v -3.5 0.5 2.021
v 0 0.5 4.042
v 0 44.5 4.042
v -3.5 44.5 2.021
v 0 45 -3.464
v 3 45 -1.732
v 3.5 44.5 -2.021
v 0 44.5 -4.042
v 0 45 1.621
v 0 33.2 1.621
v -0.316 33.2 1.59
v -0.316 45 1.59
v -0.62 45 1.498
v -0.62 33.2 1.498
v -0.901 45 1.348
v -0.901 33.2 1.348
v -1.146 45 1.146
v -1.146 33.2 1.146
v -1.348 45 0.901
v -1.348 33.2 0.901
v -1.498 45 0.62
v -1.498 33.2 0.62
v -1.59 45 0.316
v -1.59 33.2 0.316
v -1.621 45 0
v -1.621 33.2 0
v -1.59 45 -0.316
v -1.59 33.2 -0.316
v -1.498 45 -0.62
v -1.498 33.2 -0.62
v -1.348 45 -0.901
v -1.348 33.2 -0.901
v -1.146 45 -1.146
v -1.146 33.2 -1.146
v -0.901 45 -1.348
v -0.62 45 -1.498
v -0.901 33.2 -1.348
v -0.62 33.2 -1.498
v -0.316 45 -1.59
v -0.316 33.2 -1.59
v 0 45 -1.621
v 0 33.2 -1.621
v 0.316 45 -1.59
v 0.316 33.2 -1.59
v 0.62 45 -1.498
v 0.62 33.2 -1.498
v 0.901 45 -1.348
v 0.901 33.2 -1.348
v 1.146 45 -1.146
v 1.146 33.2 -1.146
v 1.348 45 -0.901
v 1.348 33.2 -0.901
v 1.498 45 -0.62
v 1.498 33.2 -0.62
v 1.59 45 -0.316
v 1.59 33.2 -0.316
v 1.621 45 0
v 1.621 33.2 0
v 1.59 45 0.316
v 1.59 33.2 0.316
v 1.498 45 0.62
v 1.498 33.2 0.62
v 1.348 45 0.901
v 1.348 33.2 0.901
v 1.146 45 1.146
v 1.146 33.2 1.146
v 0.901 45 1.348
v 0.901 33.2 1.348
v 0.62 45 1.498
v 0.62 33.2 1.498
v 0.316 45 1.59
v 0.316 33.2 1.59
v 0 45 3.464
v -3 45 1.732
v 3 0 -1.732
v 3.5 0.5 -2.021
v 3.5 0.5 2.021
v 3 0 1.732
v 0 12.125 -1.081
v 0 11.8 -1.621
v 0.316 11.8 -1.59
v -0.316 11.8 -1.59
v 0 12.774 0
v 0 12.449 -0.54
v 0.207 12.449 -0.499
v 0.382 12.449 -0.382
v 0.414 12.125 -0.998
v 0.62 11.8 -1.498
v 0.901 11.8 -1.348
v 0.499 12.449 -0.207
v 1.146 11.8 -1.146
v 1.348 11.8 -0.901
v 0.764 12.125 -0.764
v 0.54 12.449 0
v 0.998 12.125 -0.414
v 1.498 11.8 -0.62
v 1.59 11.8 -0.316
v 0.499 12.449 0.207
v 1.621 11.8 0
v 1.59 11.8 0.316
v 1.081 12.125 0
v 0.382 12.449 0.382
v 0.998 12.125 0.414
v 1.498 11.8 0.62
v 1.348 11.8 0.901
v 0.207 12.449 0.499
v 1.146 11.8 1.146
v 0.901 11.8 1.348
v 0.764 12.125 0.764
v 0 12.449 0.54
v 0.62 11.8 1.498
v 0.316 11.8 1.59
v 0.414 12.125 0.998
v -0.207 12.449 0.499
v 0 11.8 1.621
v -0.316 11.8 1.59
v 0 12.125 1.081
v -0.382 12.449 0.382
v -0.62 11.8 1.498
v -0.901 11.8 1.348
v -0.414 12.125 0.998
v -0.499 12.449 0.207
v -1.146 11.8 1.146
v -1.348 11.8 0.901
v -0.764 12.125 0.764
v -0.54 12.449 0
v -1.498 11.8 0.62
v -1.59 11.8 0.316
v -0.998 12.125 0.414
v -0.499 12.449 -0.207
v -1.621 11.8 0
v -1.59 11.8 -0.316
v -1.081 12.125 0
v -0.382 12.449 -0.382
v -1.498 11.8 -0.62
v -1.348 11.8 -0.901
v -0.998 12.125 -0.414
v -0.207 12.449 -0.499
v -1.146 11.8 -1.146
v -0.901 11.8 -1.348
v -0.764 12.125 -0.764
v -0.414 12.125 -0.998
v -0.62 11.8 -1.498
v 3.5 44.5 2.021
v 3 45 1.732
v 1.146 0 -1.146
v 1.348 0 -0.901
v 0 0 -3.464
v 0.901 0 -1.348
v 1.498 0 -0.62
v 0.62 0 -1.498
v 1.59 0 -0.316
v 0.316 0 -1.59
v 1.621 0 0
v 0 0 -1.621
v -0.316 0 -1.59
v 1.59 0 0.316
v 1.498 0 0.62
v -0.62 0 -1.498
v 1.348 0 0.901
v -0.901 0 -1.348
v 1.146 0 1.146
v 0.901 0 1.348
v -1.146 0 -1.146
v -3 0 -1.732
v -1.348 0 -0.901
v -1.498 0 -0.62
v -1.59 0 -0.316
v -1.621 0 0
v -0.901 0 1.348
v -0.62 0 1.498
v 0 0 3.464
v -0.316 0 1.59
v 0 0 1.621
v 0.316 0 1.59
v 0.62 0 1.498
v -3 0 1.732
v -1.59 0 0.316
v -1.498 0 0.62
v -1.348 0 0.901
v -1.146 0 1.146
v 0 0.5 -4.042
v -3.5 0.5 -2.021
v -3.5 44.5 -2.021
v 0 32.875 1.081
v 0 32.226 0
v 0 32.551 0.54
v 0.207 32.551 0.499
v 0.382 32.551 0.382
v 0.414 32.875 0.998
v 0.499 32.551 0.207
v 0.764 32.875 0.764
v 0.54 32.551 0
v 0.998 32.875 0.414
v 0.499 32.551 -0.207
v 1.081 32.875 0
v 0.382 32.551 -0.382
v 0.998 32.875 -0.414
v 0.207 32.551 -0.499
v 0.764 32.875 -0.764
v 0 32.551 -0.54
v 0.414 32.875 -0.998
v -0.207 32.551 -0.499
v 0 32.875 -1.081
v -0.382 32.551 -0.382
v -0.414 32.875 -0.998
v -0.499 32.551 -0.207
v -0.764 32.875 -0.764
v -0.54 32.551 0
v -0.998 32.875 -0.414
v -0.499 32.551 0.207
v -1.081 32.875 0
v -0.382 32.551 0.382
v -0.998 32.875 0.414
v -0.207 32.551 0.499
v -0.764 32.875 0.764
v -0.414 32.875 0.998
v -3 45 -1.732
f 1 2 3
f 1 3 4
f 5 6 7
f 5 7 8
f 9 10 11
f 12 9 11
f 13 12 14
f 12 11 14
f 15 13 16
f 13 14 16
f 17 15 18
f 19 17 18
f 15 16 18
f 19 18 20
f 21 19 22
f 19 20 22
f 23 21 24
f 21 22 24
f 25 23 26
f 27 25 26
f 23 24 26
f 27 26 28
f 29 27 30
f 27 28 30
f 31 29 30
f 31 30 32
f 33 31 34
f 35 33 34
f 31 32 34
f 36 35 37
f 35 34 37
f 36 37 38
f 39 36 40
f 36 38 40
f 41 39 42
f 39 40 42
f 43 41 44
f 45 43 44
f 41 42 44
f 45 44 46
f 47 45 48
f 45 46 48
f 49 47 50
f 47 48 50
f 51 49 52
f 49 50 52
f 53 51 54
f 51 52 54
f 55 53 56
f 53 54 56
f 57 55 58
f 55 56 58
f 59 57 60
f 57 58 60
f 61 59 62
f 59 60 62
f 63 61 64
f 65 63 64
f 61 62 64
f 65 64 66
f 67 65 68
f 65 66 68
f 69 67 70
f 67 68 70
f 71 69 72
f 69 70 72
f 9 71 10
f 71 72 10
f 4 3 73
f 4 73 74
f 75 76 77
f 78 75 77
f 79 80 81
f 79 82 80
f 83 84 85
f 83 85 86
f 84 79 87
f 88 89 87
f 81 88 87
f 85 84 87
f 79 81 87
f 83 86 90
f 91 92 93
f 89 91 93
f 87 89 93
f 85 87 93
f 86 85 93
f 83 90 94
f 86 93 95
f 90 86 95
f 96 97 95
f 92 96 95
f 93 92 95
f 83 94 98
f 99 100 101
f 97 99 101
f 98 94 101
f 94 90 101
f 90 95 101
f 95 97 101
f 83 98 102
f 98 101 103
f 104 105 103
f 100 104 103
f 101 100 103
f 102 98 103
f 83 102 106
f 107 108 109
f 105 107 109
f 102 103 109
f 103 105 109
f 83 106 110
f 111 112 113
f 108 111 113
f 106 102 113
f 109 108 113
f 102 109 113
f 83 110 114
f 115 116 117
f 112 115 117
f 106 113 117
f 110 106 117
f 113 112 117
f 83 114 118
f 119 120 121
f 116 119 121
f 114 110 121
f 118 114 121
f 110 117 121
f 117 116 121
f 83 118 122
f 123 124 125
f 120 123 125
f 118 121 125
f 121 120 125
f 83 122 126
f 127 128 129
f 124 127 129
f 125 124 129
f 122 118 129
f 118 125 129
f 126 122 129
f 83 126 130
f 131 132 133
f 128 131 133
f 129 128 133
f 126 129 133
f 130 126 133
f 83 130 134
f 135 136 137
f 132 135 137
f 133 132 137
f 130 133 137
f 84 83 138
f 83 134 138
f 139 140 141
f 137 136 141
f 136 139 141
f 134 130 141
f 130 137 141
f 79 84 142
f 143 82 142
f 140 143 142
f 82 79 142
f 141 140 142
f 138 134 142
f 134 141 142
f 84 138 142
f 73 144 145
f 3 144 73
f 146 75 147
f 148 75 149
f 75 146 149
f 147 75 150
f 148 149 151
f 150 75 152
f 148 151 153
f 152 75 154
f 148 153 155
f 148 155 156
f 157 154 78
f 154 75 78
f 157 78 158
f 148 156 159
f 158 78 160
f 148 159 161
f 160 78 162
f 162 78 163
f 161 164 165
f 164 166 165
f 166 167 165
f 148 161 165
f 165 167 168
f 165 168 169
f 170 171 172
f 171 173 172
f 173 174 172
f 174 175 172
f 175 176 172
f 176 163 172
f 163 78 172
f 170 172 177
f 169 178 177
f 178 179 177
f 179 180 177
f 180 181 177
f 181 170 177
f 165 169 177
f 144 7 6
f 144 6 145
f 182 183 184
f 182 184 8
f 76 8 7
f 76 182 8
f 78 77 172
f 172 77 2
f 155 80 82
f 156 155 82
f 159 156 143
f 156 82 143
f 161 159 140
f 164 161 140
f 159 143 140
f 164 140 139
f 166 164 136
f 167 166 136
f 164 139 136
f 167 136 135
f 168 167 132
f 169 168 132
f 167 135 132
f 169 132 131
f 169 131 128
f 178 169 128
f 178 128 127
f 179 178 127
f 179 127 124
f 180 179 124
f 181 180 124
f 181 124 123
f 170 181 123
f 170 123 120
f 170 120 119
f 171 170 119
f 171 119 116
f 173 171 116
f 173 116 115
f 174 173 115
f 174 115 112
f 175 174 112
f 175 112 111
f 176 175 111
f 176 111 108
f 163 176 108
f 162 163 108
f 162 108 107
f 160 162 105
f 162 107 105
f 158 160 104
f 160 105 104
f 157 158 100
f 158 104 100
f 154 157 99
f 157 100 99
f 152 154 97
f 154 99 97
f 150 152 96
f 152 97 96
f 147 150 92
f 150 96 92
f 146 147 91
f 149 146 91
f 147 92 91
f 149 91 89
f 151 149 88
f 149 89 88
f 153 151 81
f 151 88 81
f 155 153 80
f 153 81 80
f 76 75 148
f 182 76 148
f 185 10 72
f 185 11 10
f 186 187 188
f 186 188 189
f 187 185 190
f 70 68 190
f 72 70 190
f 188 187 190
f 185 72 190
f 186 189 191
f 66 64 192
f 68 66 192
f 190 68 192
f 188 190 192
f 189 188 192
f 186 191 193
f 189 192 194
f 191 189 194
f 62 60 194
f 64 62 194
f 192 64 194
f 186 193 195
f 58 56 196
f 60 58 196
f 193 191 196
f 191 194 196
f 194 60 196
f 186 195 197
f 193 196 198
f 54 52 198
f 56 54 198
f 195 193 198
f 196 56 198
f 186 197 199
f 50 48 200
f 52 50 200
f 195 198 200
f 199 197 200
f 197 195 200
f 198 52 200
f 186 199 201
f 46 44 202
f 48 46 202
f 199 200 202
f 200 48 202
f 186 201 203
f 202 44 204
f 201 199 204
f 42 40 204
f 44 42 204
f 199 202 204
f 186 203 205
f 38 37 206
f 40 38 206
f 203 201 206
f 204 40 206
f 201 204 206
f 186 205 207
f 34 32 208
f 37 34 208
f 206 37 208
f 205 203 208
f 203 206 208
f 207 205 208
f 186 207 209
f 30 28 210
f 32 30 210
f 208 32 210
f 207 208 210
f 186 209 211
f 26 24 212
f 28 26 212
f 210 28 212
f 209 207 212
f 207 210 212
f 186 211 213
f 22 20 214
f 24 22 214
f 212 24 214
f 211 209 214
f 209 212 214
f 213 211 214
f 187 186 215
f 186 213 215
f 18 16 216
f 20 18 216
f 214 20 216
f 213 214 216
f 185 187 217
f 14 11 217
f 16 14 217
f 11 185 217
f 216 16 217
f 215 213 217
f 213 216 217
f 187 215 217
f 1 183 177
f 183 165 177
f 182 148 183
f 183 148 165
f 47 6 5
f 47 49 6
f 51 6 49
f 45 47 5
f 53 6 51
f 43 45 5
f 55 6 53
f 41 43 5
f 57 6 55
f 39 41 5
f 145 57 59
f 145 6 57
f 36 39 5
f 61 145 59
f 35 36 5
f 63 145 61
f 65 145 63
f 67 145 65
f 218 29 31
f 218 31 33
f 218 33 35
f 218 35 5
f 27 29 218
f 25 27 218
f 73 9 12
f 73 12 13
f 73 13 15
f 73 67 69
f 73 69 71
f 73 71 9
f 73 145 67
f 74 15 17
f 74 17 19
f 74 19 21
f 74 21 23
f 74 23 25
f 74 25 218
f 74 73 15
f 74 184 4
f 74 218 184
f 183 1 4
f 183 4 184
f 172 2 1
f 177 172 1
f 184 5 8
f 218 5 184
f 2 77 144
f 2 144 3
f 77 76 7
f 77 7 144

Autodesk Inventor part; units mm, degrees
ref_plane "YZ Plane" through (0, 0, 0) normal (1, 0, 0) x (0, 1, 0)
ref_plane "XZ Plane" through (0, 0, 0) normal (0, 1, 0) x (-1, 0, 0)
ref_plane "XY Plane" through (0, 0, 0) normal (0, 0, 1) x (1, 0, 0)
sketch "Skizze1" plane through (0, 0, 0) normal (0, 1, 0) x (-1, 0, 0)
  line L0 (3.5, -2.0207) -> (0, -4.0415)
  line L1 (0, -4.0415) -> (-3.5, -2.0207)
  line L2 (-3.5, -2.0207) -> (-3.5, 2.0207)
  line L3 (-3.5, 2.0207) -> (0, 4.0415)
  line L4 (0, 4.0415) -> (3.5, 2.0207)
  line L5 (3.5, 2.0207) -> (3.5, -2.0207)
  point P0 (0, 0)
  point P1 (0, 0)
  dimension "d0" = 7
extrude "Extrusion1" add sketch "Skizze1" along normal blind 45
sketch "Skizze2" plane through (0, 45, 0) normal (0, 1, 0) x (1, 0, 0)
  point P0 (0, 0)
  point P1 (0, 0)
hole "Bohrung1" at (0, 45, 0) direction (0, -1, 0) diameter 3.242 depth 11.8 tip angle 118 thread size "M4x0.7" class "6H" standard "ISO Metric profile"
sketch "Skizze3" plane through (0, 0, 0) normal (0, -1, 0) x (1, 0, 0)
  point P0 (0, 0)
  point P1 (0, 0)
hole "Bohrung2" at (0, 0, 0) direction (0, 1, 0) diameter 3.242 depth 11.8 tip angle 118 thread size "M4x0.7" class "6H" standard "ISO Metric profile"
chamfer "Fasen1" distance 0.5 angle 45 12 edges at (-1.75, 45, 3.0311) (1.75, 45, 3.0311) (3.5, 45, 0) (1.75, 45, -3.0311) (-1.75, 45, -3.0311) (-3.5, 45, 0) (-3.5, 0, 0) (-1.75, 0, 3.0311) (1.75, 0, 3.0311) (3.5, 0, 0) (1.75, 0, -3.0311) (-1.75, 0, -3.0311)
properties part number "Abstandsbolzen 45mm" material "Aluminium 6061"
